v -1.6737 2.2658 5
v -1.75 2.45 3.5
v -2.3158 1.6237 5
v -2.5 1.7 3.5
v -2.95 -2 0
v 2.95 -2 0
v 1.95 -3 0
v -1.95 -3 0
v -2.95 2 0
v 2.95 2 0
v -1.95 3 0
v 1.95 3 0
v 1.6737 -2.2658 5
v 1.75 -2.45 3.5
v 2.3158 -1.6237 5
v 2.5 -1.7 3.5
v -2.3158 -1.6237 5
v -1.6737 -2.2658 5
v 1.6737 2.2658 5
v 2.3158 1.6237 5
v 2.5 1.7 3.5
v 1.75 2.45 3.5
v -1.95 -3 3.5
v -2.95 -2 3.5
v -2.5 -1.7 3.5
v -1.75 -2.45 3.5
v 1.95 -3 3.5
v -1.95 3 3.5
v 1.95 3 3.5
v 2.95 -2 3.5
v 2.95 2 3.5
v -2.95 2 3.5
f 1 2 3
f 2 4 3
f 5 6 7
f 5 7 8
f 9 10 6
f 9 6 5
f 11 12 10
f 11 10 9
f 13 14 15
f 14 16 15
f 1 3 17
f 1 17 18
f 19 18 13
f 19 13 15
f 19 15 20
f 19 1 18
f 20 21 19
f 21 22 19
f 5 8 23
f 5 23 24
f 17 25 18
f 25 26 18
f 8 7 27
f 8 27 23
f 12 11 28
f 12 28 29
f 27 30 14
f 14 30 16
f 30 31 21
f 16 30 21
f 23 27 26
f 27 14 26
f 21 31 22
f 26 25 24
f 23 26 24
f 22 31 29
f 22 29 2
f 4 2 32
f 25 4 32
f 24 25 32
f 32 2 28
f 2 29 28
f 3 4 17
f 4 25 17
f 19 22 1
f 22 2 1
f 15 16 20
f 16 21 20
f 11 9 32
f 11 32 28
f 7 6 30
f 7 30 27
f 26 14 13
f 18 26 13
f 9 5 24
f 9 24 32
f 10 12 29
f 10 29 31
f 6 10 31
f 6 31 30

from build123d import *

# Parameters (mm, degrees)
BOSS_EXTRUDE1_DEPTH = 3.5
BOSS_EXTRUDE2_DEPTH = 1.5
BOSS_EXTRUDE2_TAPER = 7


with BuildPart() as part:
    # Sketch1 → Boss-Extrude1 (new body)
    with BuildSketch(Plane.XY):
        Polygon((-2.95, 2), (-1.95, 3), (1.95, 3), (2.95, 2), (2.95, -2), (1.95, -3), (-1.95, -3), (-2.95, -2), align=None)
    extrude(amount=BOSS_EXTRUDE1_DEPTH)

    # Sketch2 → Boss-Extrude2 (add)
    with BuildSketch(Plane.XY.offset(3.5)):
        Polygon((-2.5, 1.7), (-2.5, -1.7), (-1.75, -2.45), (1.75, -2.45), (2.5, -1.7), (2.5, 1.7), (1.75, 2.45), (-1.75, 2.45), align=None)
    extrude(amount=BOSS_EXTRUDE2_DEPTH, taper=BOSS_EXTRUDE2_TAPER)


solid = part.part
